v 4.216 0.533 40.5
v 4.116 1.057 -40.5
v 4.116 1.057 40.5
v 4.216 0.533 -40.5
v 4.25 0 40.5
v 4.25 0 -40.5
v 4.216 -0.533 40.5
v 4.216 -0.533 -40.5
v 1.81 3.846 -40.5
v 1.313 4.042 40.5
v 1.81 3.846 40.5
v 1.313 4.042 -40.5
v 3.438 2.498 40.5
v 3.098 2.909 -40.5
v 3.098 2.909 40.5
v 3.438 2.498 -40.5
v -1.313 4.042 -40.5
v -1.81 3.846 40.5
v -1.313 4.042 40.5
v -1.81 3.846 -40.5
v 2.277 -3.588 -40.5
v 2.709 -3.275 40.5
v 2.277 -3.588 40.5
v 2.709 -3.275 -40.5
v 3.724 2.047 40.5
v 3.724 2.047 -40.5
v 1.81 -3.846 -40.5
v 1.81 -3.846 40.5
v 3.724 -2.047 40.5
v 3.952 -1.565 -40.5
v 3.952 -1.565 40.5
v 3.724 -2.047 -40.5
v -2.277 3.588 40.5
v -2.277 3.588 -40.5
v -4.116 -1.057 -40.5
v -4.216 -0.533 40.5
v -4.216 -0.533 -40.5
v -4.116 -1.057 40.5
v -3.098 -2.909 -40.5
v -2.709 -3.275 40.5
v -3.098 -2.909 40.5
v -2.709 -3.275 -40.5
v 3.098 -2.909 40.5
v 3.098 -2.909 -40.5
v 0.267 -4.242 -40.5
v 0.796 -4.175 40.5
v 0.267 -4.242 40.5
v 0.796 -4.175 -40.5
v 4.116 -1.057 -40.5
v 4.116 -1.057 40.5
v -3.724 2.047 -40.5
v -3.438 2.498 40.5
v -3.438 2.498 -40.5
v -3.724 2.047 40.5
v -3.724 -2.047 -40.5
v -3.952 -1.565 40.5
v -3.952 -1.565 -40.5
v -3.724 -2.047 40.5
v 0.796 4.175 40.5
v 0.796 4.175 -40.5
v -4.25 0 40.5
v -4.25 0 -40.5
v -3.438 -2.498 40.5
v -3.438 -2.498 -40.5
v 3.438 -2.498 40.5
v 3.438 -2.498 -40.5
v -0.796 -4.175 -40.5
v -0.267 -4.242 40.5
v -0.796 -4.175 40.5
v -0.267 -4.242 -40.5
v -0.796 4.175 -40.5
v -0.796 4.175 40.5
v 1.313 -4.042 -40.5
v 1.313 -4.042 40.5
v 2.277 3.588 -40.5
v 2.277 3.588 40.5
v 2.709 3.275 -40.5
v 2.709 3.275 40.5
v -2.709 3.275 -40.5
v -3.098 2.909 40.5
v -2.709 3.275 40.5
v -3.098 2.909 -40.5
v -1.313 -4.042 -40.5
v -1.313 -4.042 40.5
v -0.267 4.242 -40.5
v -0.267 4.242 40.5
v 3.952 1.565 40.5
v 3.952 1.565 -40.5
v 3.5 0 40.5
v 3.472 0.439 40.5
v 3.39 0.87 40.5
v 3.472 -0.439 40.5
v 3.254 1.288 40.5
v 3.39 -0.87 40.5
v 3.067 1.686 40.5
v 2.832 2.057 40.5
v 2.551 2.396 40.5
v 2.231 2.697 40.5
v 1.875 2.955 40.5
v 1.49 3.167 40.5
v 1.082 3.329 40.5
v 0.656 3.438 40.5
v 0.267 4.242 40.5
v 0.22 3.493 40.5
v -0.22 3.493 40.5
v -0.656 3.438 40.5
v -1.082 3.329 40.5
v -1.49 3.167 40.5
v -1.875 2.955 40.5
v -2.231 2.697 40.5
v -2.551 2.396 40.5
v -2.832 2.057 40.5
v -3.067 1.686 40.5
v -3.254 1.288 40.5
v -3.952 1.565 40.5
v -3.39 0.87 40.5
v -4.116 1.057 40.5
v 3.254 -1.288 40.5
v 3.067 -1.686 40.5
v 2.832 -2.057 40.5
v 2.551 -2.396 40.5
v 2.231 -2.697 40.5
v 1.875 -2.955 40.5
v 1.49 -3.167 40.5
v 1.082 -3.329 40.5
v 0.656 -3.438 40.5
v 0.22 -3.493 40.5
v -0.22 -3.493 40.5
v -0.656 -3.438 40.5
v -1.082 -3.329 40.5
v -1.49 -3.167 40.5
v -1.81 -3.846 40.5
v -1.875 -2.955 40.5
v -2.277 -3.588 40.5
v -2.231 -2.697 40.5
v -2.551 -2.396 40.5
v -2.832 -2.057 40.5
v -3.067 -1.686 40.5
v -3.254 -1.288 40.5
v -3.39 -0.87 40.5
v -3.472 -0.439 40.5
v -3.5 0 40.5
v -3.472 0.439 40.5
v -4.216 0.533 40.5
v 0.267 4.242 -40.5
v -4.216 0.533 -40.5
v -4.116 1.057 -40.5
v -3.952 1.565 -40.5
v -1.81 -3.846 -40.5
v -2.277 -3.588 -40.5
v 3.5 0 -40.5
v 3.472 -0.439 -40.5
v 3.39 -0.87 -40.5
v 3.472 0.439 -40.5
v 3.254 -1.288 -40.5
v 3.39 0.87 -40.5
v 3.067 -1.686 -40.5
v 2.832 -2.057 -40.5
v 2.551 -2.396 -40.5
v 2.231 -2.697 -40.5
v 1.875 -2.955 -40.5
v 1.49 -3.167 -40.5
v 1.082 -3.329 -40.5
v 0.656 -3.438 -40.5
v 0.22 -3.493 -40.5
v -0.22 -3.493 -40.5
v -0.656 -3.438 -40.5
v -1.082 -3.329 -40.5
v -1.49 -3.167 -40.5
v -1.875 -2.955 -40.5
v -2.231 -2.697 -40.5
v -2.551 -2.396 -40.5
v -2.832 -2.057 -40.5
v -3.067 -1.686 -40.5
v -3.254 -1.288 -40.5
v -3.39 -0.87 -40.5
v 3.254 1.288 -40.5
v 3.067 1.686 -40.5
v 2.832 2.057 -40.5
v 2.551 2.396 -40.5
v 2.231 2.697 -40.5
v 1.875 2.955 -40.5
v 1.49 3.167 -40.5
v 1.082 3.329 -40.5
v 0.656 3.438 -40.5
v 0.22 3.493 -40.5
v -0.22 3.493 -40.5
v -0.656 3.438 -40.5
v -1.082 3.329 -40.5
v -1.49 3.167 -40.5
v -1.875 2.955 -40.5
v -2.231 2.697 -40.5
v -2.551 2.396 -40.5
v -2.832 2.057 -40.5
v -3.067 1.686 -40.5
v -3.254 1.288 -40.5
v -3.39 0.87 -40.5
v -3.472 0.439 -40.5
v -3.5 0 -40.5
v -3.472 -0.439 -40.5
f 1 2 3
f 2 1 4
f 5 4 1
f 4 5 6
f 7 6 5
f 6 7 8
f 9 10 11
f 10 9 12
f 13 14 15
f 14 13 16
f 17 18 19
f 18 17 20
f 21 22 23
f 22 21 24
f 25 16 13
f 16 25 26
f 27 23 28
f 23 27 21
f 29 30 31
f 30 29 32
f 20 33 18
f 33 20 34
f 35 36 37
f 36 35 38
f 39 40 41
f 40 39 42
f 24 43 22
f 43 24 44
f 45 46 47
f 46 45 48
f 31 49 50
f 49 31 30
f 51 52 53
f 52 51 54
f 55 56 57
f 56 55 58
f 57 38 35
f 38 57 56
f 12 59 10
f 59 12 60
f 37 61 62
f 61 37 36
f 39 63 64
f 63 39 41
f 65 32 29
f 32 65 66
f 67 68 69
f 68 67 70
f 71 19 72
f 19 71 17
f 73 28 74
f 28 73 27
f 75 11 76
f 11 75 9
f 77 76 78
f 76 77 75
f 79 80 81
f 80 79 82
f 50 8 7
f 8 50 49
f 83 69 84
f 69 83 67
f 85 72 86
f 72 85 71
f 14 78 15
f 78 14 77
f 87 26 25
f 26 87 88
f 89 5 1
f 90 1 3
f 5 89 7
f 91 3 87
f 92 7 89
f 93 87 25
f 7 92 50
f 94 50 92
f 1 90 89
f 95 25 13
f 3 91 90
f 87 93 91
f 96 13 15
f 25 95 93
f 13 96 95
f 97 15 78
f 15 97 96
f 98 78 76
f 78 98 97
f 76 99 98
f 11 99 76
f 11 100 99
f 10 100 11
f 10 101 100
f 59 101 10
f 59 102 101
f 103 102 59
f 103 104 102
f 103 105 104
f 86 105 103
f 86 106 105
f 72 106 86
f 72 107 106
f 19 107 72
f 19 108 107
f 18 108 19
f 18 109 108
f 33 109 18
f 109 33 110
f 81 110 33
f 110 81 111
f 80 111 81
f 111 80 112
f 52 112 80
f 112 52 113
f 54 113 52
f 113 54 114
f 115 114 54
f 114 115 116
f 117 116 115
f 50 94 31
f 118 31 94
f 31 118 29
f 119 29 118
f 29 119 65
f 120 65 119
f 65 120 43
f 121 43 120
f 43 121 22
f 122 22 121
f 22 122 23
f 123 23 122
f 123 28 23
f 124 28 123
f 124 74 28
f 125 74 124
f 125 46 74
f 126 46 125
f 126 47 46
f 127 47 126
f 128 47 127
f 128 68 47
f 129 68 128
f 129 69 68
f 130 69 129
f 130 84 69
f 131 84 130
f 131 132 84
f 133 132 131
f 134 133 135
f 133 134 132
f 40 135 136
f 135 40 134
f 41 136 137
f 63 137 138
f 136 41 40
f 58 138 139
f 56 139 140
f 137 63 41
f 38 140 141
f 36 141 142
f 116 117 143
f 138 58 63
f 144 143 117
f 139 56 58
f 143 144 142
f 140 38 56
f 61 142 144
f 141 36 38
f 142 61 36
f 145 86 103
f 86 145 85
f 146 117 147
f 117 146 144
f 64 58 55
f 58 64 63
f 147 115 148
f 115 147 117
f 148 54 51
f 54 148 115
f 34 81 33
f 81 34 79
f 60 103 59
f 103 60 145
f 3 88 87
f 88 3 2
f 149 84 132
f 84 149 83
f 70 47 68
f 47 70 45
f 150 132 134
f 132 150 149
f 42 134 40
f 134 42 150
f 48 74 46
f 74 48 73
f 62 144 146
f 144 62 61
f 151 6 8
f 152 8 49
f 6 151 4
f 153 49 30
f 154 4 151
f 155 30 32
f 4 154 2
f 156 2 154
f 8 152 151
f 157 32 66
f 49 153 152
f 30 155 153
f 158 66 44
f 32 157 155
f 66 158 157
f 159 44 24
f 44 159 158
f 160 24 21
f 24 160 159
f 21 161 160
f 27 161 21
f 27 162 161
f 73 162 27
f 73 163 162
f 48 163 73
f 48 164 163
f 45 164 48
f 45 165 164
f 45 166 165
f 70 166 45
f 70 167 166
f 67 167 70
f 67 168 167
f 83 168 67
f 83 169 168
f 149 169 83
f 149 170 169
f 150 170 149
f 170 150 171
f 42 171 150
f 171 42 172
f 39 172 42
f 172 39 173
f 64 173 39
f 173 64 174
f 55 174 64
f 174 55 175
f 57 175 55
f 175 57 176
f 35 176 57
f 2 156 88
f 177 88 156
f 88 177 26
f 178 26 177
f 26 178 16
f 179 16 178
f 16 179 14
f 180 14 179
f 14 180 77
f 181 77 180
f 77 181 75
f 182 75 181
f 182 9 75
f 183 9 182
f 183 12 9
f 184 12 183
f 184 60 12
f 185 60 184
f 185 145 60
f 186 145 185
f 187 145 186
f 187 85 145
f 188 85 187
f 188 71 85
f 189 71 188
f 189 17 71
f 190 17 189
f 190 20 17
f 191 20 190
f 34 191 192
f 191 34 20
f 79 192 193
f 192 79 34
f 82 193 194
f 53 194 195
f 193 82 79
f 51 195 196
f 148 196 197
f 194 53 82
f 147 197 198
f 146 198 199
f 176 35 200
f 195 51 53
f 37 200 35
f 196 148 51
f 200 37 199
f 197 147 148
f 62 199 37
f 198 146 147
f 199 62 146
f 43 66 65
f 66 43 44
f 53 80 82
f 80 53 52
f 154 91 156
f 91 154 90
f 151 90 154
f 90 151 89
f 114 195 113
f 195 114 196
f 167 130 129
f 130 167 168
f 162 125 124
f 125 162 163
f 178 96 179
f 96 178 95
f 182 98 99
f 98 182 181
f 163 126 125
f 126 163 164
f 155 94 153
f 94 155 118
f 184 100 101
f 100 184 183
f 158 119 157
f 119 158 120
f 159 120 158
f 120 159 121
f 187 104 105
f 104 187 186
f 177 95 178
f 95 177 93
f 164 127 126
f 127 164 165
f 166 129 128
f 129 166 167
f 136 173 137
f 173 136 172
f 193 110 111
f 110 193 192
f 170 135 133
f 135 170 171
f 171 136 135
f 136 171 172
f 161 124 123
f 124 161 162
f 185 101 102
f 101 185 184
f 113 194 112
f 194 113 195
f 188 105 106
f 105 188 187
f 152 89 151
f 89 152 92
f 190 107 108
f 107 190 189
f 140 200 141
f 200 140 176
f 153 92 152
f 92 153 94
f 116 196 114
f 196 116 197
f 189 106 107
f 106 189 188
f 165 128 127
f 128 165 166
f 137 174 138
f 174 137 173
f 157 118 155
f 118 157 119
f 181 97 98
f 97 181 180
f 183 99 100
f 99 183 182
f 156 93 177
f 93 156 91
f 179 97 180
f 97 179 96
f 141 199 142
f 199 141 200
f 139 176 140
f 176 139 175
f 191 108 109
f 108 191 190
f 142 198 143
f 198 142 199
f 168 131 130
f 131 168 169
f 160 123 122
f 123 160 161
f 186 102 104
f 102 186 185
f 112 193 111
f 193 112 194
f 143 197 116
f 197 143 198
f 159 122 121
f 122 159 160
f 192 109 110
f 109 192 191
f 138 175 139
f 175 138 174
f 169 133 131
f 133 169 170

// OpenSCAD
$fn = 50;


difference() {
	union() {
		translate(v = [0, 0, -40.5000000000]) {
			cylinder(h = 81, r = 4.2500000000);
		}
	}
	union() {
		translate(v = [0, 0, -100.0000000000]) {
			cylinder(h = 200, r = 3.5000000000);
		}
	}
}
